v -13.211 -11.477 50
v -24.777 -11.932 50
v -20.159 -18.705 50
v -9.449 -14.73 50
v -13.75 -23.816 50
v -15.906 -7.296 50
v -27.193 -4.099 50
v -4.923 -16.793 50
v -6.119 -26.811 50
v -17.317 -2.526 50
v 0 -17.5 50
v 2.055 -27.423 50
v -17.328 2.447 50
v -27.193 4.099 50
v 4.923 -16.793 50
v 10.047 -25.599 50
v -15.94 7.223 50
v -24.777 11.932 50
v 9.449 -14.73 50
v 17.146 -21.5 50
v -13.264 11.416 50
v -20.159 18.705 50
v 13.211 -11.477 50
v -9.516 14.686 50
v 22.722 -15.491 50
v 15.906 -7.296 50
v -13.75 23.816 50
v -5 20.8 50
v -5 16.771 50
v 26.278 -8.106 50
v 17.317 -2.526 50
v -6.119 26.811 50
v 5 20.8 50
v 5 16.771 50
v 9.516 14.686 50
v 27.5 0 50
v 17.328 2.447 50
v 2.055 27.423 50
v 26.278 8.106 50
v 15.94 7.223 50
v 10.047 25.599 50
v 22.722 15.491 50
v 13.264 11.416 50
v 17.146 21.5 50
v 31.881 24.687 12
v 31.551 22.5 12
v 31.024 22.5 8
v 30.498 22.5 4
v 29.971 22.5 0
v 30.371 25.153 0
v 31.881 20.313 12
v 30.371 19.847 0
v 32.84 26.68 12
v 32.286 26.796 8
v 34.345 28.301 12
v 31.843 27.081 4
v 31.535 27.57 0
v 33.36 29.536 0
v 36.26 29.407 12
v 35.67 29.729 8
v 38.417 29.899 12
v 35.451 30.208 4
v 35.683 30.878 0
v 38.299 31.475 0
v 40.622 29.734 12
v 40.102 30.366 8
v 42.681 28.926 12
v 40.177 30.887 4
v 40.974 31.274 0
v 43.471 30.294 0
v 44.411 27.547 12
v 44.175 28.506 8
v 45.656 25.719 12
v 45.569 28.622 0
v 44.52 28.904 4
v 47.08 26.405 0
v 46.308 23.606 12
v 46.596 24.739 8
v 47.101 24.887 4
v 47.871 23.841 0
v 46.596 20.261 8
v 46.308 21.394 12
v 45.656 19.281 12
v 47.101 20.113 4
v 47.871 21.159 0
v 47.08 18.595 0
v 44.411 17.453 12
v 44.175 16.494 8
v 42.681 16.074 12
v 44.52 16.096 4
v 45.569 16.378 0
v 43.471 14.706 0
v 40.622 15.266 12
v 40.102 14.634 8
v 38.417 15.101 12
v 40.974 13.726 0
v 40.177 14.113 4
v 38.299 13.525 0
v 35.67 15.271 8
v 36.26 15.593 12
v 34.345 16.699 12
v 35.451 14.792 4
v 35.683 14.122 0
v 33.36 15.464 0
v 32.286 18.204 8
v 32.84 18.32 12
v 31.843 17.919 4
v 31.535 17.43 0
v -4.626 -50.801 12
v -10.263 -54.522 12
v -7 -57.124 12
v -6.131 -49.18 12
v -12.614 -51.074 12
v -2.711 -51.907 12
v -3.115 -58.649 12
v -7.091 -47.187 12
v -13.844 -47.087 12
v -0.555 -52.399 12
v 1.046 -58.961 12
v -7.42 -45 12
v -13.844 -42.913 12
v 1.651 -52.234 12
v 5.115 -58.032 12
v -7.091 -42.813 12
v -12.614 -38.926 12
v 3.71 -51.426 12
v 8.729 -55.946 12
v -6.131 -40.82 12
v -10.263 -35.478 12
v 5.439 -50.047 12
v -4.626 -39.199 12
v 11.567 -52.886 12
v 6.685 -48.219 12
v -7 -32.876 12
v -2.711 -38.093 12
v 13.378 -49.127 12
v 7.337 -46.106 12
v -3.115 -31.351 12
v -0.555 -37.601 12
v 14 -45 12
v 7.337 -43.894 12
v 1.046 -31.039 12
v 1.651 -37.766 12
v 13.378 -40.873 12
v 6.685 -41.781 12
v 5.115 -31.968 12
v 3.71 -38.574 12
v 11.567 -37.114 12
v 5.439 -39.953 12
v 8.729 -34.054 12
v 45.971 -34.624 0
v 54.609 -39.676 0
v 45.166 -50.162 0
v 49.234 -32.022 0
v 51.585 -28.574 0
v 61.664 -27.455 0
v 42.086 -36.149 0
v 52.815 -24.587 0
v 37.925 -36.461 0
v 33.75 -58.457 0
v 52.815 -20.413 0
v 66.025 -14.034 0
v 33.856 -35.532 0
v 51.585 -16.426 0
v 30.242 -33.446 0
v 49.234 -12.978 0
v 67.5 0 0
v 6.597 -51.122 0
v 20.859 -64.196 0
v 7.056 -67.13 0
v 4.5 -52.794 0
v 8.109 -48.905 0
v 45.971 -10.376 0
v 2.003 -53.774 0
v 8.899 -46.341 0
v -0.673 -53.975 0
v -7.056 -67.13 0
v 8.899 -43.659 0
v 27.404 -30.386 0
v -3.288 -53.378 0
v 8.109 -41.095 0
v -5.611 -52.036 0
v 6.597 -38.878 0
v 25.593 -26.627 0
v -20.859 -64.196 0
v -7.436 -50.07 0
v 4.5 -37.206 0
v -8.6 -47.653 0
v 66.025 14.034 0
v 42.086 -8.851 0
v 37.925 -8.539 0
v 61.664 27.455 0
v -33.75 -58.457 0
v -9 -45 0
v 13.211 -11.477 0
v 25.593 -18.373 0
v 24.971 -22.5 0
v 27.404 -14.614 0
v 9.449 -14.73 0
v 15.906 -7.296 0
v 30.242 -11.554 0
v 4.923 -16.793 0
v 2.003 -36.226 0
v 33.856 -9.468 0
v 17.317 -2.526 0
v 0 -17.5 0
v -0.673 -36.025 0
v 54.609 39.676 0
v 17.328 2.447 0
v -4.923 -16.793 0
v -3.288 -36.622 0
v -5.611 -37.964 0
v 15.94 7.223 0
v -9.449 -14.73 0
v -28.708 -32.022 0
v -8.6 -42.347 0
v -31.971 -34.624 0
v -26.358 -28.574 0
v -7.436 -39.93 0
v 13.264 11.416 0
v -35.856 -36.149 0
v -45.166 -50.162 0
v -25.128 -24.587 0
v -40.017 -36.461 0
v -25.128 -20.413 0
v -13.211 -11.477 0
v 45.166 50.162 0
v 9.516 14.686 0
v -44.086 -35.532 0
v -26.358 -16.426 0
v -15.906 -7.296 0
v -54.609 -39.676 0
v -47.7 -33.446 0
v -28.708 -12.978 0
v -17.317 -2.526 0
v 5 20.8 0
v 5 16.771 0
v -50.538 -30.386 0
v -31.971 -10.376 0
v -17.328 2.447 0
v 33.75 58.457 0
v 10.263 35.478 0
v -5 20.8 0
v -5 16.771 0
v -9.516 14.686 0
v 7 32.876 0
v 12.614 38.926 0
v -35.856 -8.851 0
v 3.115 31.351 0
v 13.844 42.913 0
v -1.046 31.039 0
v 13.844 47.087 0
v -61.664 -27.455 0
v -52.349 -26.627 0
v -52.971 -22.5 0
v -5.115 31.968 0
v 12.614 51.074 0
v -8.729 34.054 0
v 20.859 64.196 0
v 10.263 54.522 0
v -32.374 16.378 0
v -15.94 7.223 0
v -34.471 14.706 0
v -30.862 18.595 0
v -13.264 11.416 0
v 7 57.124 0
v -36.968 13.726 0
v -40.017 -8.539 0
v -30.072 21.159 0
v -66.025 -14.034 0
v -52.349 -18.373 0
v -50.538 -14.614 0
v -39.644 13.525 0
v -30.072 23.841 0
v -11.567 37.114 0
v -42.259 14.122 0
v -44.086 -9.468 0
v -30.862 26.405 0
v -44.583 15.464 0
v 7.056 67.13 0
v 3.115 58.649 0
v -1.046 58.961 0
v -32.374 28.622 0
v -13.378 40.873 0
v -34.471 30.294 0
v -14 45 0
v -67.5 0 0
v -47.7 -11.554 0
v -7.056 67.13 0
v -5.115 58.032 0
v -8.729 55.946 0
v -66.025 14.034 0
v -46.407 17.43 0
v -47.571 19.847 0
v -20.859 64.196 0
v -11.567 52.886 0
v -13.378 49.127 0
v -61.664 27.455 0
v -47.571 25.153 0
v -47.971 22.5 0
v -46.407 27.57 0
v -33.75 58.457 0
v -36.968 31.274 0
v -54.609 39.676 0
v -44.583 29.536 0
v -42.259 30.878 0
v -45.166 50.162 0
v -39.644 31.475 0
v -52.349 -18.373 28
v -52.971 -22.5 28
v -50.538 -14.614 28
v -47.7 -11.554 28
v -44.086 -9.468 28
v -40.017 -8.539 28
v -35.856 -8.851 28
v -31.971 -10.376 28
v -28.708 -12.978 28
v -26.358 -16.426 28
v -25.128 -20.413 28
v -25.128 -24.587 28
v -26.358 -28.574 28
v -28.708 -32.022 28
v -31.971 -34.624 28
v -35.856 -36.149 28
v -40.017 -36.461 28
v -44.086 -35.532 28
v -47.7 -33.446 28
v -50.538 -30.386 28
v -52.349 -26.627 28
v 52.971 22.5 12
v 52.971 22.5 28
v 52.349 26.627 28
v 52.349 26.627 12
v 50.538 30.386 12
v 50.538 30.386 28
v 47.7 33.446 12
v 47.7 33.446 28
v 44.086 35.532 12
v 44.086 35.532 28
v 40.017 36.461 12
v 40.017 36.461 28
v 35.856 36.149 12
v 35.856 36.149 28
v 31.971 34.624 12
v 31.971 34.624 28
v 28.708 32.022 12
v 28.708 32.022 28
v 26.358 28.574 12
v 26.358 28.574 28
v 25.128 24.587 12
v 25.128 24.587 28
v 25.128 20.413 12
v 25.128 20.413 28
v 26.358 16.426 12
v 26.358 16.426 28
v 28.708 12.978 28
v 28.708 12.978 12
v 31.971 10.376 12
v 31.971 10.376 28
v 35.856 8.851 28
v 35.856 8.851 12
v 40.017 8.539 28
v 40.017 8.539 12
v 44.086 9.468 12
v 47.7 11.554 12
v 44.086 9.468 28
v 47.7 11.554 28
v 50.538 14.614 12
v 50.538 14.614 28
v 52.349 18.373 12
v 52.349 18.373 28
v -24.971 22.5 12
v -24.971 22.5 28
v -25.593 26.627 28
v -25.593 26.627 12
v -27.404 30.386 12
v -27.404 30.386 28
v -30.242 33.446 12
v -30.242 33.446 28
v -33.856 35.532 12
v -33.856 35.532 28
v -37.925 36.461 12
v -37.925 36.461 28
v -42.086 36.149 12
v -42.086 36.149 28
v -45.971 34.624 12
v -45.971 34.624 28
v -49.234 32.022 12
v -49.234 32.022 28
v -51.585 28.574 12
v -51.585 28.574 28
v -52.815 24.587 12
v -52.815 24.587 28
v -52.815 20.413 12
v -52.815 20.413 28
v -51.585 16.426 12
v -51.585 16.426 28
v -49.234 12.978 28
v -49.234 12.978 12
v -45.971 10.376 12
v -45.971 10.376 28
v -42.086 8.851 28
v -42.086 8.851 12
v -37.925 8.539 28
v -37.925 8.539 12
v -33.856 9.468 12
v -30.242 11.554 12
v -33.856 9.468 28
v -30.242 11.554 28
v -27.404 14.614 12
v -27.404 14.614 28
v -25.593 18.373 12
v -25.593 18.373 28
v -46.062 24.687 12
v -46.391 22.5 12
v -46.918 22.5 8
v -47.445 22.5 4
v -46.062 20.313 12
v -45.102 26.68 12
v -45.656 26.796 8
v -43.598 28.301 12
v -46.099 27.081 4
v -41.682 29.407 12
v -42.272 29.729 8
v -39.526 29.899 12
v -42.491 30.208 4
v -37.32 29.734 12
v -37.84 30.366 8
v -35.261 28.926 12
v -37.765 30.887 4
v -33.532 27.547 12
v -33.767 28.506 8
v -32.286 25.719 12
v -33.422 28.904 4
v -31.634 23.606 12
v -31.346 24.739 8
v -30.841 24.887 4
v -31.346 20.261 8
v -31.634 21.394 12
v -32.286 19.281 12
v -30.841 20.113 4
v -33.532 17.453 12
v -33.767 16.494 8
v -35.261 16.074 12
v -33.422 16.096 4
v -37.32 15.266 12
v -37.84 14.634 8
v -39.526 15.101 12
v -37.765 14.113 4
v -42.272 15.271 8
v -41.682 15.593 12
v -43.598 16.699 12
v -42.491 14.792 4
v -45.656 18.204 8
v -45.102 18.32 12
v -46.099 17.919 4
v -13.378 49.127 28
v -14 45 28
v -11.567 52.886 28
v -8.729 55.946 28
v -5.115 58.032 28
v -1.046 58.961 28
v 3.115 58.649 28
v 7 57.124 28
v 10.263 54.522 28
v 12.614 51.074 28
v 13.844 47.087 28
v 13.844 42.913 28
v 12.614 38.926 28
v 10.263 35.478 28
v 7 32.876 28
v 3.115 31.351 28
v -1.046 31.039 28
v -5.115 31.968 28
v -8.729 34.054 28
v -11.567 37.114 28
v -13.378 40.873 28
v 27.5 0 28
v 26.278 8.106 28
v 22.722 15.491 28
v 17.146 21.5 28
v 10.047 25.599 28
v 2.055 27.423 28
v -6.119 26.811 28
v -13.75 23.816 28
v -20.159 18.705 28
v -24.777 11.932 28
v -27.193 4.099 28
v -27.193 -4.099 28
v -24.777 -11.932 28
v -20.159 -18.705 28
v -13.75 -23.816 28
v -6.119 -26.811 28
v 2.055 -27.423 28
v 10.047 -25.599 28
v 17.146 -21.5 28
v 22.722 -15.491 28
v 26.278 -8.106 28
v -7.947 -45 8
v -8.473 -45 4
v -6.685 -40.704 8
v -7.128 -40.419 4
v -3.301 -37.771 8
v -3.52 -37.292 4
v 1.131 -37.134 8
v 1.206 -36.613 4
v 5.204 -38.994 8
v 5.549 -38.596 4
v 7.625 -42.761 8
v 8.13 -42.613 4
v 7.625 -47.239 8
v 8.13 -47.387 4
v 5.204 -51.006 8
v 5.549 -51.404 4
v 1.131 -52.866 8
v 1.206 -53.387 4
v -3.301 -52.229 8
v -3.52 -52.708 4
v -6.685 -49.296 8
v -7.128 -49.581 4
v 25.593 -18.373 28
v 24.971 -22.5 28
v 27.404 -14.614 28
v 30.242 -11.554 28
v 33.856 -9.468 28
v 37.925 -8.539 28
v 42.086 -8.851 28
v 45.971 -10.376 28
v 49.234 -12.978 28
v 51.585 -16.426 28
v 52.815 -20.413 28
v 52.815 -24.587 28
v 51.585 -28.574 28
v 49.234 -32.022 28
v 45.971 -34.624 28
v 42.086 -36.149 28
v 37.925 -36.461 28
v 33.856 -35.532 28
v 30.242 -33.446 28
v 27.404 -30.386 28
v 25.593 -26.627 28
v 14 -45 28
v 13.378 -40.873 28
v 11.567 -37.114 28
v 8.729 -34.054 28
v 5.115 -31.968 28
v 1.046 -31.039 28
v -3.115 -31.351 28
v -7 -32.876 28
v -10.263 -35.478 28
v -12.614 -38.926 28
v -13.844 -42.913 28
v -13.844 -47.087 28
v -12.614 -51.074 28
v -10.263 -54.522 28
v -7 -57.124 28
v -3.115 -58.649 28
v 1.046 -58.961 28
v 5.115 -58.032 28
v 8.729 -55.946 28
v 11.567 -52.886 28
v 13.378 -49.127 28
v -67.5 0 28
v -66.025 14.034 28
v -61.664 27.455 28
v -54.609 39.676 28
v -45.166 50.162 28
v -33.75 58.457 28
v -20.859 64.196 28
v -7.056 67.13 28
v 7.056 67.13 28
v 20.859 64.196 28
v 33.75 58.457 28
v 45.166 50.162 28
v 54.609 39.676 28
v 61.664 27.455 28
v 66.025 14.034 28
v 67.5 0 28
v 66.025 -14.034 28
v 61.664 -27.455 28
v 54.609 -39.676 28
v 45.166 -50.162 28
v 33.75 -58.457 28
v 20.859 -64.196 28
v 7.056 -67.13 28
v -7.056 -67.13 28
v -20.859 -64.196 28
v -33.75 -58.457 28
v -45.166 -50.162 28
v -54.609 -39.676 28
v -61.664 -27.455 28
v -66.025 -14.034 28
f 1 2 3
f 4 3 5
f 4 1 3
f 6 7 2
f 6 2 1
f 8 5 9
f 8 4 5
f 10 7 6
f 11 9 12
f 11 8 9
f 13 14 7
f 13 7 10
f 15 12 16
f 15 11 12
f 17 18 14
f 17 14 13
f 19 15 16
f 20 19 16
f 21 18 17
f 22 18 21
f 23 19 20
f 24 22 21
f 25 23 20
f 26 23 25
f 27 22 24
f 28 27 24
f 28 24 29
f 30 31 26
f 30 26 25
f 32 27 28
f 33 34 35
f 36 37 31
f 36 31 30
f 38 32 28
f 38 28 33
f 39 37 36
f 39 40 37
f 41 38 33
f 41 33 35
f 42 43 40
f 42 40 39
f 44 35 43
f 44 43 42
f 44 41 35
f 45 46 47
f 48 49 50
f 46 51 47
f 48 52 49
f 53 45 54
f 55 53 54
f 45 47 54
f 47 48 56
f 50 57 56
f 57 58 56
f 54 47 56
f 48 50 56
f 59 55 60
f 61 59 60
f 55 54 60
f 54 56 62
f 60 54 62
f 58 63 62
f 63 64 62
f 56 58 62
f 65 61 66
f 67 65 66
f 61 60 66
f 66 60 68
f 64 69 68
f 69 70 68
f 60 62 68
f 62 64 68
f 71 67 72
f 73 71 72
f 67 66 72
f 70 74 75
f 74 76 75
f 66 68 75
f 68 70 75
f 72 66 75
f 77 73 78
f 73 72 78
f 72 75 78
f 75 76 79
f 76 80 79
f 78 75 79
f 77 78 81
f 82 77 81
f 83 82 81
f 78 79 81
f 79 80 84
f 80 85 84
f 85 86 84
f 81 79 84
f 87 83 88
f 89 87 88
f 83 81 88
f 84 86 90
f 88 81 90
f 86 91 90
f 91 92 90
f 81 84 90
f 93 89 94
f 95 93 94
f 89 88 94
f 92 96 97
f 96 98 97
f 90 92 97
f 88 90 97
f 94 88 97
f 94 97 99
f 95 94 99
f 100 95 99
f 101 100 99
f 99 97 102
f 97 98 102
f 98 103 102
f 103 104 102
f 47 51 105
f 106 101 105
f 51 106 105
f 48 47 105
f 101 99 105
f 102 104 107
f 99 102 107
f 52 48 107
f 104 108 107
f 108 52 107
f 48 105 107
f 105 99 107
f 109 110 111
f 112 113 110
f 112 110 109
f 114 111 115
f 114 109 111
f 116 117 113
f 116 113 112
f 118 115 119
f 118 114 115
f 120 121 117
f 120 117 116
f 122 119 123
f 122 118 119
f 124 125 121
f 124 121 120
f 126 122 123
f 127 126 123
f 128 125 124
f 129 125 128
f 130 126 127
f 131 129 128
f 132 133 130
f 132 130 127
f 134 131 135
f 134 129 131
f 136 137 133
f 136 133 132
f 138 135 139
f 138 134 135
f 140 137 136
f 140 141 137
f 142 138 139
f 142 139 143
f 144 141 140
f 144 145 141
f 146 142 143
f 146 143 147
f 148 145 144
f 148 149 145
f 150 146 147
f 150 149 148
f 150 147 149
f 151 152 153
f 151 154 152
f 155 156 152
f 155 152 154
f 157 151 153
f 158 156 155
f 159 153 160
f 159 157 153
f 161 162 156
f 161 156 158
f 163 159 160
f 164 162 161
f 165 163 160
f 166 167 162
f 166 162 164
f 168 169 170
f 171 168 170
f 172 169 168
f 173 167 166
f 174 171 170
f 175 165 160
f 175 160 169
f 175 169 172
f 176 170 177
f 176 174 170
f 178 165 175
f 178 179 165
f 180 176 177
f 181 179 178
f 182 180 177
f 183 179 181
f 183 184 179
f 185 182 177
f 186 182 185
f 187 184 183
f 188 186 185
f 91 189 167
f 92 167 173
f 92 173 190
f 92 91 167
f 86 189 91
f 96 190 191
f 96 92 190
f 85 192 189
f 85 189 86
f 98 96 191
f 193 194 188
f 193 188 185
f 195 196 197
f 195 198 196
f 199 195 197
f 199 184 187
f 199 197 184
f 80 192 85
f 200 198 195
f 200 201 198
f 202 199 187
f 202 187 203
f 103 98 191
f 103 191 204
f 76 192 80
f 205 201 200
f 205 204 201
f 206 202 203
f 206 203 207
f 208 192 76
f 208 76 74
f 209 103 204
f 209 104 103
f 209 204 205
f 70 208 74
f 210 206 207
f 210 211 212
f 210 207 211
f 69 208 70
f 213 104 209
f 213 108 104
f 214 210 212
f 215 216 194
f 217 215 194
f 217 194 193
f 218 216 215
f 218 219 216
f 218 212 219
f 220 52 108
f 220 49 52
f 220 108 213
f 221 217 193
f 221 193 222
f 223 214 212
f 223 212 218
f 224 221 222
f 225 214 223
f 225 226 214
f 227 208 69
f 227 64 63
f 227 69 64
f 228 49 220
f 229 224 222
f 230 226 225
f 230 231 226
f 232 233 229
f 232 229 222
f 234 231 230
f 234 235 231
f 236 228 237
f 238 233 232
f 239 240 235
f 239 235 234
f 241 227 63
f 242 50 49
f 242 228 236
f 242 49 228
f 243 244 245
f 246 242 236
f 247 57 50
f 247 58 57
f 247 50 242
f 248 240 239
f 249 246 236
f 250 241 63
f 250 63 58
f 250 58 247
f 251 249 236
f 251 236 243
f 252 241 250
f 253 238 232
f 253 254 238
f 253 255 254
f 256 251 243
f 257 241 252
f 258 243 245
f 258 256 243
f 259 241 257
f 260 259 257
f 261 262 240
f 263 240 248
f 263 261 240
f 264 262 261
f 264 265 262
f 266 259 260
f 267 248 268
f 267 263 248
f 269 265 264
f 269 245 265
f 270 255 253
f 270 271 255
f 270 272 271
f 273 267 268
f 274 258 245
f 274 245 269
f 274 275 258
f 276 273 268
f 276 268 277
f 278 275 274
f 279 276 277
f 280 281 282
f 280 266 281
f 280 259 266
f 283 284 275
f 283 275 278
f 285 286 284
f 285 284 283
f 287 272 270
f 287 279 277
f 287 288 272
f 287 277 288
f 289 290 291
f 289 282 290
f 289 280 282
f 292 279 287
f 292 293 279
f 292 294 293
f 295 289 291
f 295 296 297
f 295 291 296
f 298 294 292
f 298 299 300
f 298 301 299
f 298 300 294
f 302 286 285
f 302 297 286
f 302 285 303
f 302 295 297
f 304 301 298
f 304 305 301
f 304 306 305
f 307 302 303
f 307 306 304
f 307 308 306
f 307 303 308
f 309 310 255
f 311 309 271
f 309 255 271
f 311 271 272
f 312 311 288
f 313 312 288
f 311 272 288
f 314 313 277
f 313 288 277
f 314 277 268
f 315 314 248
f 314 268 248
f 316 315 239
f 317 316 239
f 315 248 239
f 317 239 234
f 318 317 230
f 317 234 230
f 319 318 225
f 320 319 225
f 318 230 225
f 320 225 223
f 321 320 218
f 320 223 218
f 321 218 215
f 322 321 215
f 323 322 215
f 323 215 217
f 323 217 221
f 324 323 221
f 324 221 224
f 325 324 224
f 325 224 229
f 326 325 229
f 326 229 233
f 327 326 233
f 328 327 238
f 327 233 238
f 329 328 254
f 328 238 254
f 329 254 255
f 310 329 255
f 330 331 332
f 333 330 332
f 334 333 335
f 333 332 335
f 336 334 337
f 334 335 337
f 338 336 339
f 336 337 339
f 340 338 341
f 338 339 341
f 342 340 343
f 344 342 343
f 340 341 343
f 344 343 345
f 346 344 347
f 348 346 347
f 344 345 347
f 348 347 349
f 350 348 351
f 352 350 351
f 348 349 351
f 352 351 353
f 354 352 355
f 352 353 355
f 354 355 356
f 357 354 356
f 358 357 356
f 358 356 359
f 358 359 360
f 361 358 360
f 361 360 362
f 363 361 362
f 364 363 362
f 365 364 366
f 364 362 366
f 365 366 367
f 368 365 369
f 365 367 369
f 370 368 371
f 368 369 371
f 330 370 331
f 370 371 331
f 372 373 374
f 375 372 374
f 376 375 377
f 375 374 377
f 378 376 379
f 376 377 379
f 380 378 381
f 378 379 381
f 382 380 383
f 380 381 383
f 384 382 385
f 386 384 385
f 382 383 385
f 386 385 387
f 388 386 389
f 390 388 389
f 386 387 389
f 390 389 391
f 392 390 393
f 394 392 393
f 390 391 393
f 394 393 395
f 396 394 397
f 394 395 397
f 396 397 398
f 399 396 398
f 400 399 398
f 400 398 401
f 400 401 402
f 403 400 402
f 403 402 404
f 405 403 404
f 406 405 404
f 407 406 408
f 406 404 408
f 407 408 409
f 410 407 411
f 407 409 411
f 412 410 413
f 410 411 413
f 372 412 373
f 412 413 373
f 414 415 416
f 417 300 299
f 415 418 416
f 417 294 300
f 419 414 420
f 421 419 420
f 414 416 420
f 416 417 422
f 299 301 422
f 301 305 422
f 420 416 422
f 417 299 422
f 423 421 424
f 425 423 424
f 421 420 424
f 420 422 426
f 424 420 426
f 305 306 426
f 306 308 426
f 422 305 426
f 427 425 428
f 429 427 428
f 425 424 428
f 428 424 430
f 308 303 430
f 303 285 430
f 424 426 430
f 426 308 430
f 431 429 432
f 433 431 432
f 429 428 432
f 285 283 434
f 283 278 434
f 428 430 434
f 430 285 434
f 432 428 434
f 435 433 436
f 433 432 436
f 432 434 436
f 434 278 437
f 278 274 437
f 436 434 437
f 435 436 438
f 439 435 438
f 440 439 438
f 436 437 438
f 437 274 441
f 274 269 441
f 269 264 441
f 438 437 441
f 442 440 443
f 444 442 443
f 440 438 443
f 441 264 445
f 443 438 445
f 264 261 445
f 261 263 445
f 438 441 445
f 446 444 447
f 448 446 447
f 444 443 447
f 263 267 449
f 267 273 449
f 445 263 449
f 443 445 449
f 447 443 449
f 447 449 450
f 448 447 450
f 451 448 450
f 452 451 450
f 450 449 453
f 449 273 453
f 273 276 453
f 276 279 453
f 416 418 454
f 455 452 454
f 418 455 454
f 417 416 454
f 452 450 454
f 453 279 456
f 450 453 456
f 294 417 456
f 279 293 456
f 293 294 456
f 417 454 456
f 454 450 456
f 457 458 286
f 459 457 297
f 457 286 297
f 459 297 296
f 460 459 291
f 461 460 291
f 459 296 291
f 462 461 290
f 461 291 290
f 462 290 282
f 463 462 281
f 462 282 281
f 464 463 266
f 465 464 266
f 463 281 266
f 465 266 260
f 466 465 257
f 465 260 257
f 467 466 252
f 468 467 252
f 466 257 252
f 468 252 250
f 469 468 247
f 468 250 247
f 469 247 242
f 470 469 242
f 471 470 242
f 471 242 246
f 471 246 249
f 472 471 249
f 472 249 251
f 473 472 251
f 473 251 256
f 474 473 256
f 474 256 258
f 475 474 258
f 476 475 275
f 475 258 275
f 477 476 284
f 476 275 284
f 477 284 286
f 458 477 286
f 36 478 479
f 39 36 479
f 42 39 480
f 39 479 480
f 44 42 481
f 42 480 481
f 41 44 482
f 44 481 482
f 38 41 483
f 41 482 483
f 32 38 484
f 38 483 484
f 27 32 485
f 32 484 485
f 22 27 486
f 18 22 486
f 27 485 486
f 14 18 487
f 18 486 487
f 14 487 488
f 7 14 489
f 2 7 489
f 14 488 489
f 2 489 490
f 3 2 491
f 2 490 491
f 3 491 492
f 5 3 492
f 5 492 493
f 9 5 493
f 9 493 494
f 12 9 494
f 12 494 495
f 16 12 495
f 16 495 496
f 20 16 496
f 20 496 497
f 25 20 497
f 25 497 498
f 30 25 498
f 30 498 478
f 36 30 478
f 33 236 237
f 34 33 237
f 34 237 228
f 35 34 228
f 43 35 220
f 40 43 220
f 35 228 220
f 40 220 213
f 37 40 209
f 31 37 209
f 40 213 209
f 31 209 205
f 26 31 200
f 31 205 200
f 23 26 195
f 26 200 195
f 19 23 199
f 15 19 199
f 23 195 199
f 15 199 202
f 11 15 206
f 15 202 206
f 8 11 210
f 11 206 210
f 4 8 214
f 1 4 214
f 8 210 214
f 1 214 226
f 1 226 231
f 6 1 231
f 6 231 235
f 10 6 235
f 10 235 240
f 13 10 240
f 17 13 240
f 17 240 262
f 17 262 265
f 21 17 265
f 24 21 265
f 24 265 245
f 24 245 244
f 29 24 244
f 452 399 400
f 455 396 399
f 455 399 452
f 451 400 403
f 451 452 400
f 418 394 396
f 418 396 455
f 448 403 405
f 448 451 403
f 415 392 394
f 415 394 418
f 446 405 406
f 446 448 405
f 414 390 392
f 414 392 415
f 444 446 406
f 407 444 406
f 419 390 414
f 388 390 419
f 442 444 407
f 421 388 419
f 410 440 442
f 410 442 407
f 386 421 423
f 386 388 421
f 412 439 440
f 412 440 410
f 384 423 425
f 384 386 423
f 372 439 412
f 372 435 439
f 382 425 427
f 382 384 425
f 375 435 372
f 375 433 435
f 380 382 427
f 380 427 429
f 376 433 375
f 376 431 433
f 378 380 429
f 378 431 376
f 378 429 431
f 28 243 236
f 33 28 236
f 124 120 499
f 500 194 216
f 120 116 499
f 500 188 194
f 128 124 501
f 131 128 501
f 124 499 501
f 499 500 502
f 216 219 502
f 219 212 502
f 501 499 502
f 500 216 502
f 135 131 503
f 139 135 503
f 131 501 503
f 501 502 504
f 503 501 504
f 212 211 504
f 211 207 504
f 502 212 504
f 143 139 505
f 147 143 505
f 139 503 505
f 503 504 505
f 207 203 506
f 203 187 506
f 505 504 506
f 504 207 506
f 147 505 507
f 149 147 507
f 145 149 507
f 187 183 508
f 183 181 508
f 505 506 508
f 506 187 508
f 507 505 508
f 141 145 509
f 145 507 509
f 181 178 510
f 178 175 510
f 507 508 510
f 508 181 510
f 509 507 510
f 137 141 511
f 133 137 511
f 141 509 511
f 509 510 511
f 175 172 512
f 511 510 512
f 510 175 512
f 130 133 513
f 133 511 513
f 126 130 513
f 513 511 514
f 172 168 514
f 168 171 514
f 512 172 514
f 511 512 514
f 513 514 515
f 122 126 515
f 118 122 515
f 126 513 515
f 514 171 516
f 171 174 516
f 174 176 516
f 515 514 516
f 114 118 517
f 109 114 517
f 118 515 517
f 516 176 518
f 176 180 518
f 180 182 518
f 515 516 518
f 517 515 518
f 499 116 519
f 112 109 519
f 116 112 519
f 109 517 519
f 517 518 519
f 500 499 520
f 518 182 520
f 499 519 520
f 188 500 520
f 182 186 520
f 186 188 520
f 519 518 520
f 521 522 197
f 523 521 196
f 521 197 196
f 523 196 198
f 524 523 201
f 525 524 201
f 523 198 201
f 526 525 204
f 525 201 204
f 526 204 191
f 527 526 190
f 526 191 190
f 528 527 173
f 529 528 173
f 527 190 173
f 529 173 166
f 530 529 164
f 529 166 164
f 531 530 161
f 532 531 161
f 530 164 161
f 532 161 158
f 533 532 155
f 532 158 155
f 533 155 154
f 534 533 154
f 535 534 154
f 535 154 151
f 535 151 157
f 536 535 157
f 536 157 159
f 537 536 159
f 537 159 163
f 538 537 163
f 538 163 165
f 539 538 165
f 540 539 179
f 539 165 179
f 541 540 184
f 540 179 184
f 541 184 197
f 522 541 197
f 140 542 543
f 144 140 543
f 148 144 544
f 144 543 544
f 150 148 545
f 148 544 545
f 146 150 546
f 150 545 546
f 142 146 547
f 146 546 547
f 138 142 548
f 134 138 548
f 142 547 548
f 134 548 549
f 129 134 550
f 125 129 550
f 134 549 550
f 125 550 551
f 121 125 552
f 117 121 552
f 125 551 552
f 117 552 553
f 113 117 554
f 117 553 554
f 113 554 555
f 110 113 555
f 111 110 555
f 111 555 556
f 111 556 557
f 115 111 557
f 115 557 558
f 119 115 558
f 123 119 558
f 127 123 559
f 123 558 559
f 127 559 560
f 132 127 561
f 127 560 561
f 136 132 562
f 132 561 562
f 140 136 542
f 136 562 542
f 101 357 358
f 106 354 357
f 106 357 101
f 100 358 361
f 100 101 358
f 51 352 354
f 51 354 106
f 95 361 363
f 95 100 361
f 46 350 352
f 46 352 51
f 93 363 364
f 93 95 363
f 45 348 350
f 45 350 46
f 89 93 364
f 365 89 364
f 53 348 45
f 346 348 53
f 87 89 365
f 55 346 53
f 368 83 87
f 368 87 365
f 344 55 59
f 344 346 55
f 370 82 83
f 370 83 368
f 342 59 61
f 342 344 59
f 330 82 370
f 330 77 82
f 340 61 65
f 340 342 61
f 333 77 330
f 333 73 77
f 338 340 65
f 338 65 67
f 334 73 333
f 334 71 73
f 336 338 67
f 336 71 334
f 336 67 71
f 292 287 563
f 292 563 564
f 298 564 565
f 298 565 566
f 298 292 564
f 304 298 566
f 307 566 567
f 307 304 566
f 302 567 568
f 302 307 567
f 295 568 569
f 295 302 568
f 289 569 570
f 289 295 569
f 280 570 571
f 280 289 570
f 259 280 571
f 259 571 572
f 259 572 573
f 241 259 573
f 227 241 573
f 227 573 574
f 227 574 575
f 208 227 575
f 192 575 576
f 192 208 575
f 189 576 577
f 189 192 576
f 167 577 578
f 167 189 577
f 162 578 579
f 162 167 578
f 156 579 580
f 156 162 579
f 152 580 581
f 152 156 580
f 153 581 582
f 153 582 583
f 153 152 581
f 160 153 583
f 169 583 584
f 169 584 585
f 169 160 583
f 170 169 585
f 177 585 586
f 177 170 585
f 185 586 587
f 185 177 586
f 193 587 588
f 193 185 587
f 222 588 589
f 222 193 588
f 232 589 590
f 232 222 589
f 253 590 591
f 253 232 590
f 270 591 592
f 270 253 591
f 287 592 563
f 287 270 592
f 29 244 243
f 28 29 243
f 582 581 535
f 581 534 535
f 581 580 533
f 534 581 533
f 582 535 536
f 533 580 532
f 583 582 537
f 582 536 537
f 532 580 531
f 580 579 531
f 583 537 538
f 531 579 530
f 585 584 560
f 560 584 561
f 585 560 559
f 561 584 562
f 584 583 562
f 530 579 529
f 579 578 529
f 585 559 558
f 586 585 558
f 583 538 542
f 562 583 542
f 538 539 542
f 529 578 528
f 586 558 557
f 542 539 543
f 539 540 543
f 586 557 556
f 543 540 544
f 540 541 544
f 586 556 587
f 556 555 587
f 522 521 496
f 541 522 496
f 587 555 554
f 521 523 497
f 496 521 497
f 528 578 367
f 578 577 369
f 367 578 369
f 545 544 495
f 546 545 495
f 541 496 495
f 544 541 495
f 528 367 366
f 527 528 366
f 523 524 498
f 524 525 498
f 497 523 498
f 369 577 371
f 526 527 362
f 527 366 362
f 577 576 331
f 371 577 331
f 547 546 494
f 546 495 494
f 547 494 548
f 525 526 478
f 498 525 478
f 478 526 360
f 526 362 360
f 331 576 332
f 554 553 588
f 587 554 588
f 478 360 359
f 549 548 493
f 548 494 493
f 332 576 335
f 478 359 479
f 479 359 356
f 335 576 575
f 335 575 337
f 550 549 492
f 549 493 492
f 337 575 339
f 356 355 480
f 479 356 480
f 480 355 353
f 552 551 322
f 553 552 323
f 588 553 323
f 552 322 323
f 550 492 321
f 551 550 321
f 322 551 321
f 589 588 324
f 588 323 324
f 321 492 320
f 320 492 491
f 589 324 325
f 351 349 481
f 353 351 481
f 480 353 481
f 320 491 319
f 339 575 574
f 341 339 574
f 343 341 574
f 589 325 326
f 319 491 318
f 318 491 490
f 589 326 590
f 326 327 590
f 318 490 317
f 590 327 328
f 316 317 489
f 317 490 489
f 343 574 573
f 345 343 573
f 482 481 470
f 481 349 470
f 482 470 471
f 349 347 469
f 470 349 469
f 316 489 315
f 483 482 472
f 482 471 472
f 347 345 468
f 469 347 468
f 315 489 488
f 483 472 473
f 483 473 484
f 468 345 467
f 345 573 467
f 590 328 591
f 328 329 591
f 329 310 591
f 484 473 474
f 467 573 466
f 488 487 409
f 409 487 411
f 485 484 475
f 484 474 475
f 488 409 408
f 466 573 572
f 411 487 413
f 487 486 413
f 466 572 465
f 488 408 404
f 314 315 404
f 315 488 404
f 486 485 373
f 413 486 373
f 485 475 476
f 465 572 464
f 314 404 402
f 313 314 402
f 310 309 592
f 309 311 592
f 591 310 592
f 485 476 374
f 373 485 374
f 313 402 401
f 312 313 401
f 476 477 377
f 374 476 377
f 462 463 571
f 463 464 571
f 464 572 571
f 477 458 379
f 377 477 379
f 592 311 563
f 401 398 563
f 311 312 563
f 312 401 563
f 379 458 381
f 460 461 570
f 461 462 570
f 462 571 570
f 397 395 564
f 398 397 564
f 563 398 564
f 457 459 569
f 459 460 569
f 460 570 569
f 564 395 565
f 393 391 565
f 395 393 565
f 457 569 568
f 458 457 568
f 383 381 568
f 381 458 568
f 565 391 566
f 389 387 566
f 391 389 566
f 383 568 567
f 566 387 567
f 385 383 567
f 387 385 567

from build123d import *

# Parameters (mm, degrees)
SKETCH1_R                    = 27.5
BOSS_EXTRUDE1_DEPTH          = 50
SKETCH2_R                    = 67.5
SKETCH2_R_2                  = 14
BOSS_EXTRUDE2_DEPTH          = 28
SKETCH3_R                    = 9
CUT_EXTRUDE1_DEPTH           = 12
CUT_EXTRUDE1_DRAFT           = -7.5
CUT_EXTRUDE1_PROFILE_2_DEPTH = 12
CUT_EXTRUDE1_PROFILE_2_DRAFT = -7.5
CUT_EXTRUDE1_PROFILE_3_DEPTH = 12
CUT_EXTRUDE1_PROFILE_3_DRAFT = -7.5
SKETCH4_R                    = 14
CUT_EXTRUDE2_DEPTH           = 16
CUT_EXTRUDE3_START           = -50
CUT_EXTRUDE3_DEPTH           = 50


with BuildPart() as part:
    # Sketch1 → Boss-Extrude1 (new body)
    with BuildSketch(Plane.XY):
        Circle(SKETCH1_R)
        with BuildLine():
            Line((-5, 20.8), (5, 20.8))
            Line((5, 20.8), (5, 16.770509831))
            ThreePointArc((5, 16.770509831), (0, -17.5), (-5, 16.770509831))
            Line((-5, 16.770509831), (-5, 20.8))
        make_face(mode=Mode.SUBTRACT)
    extrude(amount=BOSS_EXTRUDE1_DEPTH)

    # Sketch2 → Boss-Extrude2 (add)
    with BuildSketch(Plane(origin=(0, 0, 0), x_dir=(-1, 0, 0), z_dir=(0, 0, -1))):
        Circle(SKETCH2_R)
        with Locations((0, 45)):
            Circle(SKETCH2_R_2, mode=Mode.SUBTRACT)
        with Locations((38.97114317, -22.5)):
            Circle(SKETCH2_R_2, mode=Mode.SUBTRACT)
        with Locations((-38.97114317, -22.5)):
            Circle(SKETCH2_R_2, mode=Mode.SUBTRACT)
    extrude(amount=-BOSS_EXTRUDE2_DEPTH)


with BuildPart() as cut_extrude1_tool:
    # Sketch3 → Cut-Extrude1 (with draft: the straight prism first)
    with BuildSketch(Plane(origin=(0, 0, 0), x_dir=(-1, 0, 0), z_dir=(0, 0, -1))):
        with Locations((0, -45)):
            Circle(SKETCH3_R)
    extrude(amount=-CUT_EXTRUDE1_DEPTH)
    # Cut-Extrude1: the draft: its side faces are tilted about the plane it starts from
    cut_extrude1_sides = [cut_extrude1_tool.faces().sort_by_distance(p)[0] for p in [
        (9, -45, 6),
    ]]
    draft(cut_extrude1_sides, Plane(origin=(0, 0, 0), x_dir=(-1, 0, 0), z_dir=(0, 0, -1)), CUT_EXTRUDE1_DRAFT)


with BuildPart() as part_1:
    add(part.part)

    # Cut-Extrude1: cut by cut_extrude1_tool
    add(cut_extrude1_tool.part, mode=Mode.SUBTRACT)


with BuildPart() as cut_extrude1_profile_2_tool:
    # Sketch3 → Cut-Extrude1 profile 2 (with draft: the straight prism first)
    with BuildSketch(Plane(origin=(0, 0, 0), x_dir=(-1, 0, 0), z_dir=(0, 0, -1))):
        with Locations((-38.97114317, 22.5)):
            Circle(SKETCH3_R)
    extrude(amount=-CUT_EXTRUDE1_PROFILE_2_DEPTH)
    # Cut-Extrude1 profile 2: the draft: its side faces are tilted about the plane it starts from
    cut_extrude1_profile_2_sides = [cut_extrude1_profile_2_tool.faces().sort_by_distance(p)[0] for p in [
        (47.97114317, 22.5, 6),
    ]]
    draft(cut_extrude1_profile_2_sides, Plane(origin=(0, 0, 0), x_dir=(-1, 0, 0), z_dir=(0, 0, -1)), CUT_EXTRUDE1_PROFILE_2_DRAFT)


with BuildPart() as part_2:
    add(part_1.part)

    # Cut-Extrude1 profile 2: cut by cut_extrude1_profile_2_tool
    add(cut_extrude1_profile_2_tool.part, mode=Mode.SUBTRACT)


with BuildPart() as cut_extrude1_profile_3_tool:
    # Sketch3 → Cut-Extrude1 profile 3 (with draft: the straight prism first)
    with BuildSketch(Plane(origin=(0, 0, 0), x_dir=(-1, 0, 0), z_dir=(0, 0, -1))):
        with Locations((38.97114317, 22.5)):
            Circle(SKETCH3_R)
    extrude(amount=-CUT_EXTRUDE1_PROFILE_3_DEPTH)
    # Cut-Extrude1 profile 3: the draft: its side faces are tilted about the plane it starts from
    cut_extrude1_profile_3_sides = [cut_extrude1_profile_3_tool.faces().sort_by_distance(p)[0] for p in [
        (-29.97114317, 22.5, 6),
    ]]
    draft(cut_extrude1_profile_3_sides, Plane(origin=(0, 0, 0), x_dir=(-1, 0, 0), z_dir=(0, 0, -1)), CUT_EXTRUDE1_PROFILE_3_DRAFT)


with BuildPart() as part_3:
    add(part_2.part)

    # Cut-Extrude1 profile 3: cut by cut_extrude1_profile_3_tool
    add(cut_extrude1_profile_3_tool.part, mode=Mode.SUBTRACT)

    # Sketch4 → Cut-Extrude2 (cut)
    with BuildSketch(Plane.XY.offset(28)):
        with Locations((0, -45)):
            Circle(SKETCH4_R)
        with Locations((-38.97114317, 22.5)):
            Circle(SKETCH4_R)
        with Locations((38.97114317, 22.5)):
            Circle(SKETCH4_R)
    extrude(amount=-CUT_EXTRUDE2_DEPTH, mode=Mode.SUBTRACT)

    # Sketch7 → Cut-Extrude3 (cut)
    with BuildSketch(Plane.XY.offset(28).offset(CUT_EXTRUDE3_START)):
        with BuildLine():
            Line((-5, 16.770509831), (-5, 20.8))
            Line((-5, 20.8), (5, 20.8))
            Line((5, 20.8), (5, 16.770509831))
            ThreePointArc((5, 16.770509831), (0, -17.5), (-5, 16.770509831))
        make_face()
    extrude(amount=CUT_EXTRUDE3_DEPTH, mode=Mode.SUBTRACT)


solid = part_3.part
